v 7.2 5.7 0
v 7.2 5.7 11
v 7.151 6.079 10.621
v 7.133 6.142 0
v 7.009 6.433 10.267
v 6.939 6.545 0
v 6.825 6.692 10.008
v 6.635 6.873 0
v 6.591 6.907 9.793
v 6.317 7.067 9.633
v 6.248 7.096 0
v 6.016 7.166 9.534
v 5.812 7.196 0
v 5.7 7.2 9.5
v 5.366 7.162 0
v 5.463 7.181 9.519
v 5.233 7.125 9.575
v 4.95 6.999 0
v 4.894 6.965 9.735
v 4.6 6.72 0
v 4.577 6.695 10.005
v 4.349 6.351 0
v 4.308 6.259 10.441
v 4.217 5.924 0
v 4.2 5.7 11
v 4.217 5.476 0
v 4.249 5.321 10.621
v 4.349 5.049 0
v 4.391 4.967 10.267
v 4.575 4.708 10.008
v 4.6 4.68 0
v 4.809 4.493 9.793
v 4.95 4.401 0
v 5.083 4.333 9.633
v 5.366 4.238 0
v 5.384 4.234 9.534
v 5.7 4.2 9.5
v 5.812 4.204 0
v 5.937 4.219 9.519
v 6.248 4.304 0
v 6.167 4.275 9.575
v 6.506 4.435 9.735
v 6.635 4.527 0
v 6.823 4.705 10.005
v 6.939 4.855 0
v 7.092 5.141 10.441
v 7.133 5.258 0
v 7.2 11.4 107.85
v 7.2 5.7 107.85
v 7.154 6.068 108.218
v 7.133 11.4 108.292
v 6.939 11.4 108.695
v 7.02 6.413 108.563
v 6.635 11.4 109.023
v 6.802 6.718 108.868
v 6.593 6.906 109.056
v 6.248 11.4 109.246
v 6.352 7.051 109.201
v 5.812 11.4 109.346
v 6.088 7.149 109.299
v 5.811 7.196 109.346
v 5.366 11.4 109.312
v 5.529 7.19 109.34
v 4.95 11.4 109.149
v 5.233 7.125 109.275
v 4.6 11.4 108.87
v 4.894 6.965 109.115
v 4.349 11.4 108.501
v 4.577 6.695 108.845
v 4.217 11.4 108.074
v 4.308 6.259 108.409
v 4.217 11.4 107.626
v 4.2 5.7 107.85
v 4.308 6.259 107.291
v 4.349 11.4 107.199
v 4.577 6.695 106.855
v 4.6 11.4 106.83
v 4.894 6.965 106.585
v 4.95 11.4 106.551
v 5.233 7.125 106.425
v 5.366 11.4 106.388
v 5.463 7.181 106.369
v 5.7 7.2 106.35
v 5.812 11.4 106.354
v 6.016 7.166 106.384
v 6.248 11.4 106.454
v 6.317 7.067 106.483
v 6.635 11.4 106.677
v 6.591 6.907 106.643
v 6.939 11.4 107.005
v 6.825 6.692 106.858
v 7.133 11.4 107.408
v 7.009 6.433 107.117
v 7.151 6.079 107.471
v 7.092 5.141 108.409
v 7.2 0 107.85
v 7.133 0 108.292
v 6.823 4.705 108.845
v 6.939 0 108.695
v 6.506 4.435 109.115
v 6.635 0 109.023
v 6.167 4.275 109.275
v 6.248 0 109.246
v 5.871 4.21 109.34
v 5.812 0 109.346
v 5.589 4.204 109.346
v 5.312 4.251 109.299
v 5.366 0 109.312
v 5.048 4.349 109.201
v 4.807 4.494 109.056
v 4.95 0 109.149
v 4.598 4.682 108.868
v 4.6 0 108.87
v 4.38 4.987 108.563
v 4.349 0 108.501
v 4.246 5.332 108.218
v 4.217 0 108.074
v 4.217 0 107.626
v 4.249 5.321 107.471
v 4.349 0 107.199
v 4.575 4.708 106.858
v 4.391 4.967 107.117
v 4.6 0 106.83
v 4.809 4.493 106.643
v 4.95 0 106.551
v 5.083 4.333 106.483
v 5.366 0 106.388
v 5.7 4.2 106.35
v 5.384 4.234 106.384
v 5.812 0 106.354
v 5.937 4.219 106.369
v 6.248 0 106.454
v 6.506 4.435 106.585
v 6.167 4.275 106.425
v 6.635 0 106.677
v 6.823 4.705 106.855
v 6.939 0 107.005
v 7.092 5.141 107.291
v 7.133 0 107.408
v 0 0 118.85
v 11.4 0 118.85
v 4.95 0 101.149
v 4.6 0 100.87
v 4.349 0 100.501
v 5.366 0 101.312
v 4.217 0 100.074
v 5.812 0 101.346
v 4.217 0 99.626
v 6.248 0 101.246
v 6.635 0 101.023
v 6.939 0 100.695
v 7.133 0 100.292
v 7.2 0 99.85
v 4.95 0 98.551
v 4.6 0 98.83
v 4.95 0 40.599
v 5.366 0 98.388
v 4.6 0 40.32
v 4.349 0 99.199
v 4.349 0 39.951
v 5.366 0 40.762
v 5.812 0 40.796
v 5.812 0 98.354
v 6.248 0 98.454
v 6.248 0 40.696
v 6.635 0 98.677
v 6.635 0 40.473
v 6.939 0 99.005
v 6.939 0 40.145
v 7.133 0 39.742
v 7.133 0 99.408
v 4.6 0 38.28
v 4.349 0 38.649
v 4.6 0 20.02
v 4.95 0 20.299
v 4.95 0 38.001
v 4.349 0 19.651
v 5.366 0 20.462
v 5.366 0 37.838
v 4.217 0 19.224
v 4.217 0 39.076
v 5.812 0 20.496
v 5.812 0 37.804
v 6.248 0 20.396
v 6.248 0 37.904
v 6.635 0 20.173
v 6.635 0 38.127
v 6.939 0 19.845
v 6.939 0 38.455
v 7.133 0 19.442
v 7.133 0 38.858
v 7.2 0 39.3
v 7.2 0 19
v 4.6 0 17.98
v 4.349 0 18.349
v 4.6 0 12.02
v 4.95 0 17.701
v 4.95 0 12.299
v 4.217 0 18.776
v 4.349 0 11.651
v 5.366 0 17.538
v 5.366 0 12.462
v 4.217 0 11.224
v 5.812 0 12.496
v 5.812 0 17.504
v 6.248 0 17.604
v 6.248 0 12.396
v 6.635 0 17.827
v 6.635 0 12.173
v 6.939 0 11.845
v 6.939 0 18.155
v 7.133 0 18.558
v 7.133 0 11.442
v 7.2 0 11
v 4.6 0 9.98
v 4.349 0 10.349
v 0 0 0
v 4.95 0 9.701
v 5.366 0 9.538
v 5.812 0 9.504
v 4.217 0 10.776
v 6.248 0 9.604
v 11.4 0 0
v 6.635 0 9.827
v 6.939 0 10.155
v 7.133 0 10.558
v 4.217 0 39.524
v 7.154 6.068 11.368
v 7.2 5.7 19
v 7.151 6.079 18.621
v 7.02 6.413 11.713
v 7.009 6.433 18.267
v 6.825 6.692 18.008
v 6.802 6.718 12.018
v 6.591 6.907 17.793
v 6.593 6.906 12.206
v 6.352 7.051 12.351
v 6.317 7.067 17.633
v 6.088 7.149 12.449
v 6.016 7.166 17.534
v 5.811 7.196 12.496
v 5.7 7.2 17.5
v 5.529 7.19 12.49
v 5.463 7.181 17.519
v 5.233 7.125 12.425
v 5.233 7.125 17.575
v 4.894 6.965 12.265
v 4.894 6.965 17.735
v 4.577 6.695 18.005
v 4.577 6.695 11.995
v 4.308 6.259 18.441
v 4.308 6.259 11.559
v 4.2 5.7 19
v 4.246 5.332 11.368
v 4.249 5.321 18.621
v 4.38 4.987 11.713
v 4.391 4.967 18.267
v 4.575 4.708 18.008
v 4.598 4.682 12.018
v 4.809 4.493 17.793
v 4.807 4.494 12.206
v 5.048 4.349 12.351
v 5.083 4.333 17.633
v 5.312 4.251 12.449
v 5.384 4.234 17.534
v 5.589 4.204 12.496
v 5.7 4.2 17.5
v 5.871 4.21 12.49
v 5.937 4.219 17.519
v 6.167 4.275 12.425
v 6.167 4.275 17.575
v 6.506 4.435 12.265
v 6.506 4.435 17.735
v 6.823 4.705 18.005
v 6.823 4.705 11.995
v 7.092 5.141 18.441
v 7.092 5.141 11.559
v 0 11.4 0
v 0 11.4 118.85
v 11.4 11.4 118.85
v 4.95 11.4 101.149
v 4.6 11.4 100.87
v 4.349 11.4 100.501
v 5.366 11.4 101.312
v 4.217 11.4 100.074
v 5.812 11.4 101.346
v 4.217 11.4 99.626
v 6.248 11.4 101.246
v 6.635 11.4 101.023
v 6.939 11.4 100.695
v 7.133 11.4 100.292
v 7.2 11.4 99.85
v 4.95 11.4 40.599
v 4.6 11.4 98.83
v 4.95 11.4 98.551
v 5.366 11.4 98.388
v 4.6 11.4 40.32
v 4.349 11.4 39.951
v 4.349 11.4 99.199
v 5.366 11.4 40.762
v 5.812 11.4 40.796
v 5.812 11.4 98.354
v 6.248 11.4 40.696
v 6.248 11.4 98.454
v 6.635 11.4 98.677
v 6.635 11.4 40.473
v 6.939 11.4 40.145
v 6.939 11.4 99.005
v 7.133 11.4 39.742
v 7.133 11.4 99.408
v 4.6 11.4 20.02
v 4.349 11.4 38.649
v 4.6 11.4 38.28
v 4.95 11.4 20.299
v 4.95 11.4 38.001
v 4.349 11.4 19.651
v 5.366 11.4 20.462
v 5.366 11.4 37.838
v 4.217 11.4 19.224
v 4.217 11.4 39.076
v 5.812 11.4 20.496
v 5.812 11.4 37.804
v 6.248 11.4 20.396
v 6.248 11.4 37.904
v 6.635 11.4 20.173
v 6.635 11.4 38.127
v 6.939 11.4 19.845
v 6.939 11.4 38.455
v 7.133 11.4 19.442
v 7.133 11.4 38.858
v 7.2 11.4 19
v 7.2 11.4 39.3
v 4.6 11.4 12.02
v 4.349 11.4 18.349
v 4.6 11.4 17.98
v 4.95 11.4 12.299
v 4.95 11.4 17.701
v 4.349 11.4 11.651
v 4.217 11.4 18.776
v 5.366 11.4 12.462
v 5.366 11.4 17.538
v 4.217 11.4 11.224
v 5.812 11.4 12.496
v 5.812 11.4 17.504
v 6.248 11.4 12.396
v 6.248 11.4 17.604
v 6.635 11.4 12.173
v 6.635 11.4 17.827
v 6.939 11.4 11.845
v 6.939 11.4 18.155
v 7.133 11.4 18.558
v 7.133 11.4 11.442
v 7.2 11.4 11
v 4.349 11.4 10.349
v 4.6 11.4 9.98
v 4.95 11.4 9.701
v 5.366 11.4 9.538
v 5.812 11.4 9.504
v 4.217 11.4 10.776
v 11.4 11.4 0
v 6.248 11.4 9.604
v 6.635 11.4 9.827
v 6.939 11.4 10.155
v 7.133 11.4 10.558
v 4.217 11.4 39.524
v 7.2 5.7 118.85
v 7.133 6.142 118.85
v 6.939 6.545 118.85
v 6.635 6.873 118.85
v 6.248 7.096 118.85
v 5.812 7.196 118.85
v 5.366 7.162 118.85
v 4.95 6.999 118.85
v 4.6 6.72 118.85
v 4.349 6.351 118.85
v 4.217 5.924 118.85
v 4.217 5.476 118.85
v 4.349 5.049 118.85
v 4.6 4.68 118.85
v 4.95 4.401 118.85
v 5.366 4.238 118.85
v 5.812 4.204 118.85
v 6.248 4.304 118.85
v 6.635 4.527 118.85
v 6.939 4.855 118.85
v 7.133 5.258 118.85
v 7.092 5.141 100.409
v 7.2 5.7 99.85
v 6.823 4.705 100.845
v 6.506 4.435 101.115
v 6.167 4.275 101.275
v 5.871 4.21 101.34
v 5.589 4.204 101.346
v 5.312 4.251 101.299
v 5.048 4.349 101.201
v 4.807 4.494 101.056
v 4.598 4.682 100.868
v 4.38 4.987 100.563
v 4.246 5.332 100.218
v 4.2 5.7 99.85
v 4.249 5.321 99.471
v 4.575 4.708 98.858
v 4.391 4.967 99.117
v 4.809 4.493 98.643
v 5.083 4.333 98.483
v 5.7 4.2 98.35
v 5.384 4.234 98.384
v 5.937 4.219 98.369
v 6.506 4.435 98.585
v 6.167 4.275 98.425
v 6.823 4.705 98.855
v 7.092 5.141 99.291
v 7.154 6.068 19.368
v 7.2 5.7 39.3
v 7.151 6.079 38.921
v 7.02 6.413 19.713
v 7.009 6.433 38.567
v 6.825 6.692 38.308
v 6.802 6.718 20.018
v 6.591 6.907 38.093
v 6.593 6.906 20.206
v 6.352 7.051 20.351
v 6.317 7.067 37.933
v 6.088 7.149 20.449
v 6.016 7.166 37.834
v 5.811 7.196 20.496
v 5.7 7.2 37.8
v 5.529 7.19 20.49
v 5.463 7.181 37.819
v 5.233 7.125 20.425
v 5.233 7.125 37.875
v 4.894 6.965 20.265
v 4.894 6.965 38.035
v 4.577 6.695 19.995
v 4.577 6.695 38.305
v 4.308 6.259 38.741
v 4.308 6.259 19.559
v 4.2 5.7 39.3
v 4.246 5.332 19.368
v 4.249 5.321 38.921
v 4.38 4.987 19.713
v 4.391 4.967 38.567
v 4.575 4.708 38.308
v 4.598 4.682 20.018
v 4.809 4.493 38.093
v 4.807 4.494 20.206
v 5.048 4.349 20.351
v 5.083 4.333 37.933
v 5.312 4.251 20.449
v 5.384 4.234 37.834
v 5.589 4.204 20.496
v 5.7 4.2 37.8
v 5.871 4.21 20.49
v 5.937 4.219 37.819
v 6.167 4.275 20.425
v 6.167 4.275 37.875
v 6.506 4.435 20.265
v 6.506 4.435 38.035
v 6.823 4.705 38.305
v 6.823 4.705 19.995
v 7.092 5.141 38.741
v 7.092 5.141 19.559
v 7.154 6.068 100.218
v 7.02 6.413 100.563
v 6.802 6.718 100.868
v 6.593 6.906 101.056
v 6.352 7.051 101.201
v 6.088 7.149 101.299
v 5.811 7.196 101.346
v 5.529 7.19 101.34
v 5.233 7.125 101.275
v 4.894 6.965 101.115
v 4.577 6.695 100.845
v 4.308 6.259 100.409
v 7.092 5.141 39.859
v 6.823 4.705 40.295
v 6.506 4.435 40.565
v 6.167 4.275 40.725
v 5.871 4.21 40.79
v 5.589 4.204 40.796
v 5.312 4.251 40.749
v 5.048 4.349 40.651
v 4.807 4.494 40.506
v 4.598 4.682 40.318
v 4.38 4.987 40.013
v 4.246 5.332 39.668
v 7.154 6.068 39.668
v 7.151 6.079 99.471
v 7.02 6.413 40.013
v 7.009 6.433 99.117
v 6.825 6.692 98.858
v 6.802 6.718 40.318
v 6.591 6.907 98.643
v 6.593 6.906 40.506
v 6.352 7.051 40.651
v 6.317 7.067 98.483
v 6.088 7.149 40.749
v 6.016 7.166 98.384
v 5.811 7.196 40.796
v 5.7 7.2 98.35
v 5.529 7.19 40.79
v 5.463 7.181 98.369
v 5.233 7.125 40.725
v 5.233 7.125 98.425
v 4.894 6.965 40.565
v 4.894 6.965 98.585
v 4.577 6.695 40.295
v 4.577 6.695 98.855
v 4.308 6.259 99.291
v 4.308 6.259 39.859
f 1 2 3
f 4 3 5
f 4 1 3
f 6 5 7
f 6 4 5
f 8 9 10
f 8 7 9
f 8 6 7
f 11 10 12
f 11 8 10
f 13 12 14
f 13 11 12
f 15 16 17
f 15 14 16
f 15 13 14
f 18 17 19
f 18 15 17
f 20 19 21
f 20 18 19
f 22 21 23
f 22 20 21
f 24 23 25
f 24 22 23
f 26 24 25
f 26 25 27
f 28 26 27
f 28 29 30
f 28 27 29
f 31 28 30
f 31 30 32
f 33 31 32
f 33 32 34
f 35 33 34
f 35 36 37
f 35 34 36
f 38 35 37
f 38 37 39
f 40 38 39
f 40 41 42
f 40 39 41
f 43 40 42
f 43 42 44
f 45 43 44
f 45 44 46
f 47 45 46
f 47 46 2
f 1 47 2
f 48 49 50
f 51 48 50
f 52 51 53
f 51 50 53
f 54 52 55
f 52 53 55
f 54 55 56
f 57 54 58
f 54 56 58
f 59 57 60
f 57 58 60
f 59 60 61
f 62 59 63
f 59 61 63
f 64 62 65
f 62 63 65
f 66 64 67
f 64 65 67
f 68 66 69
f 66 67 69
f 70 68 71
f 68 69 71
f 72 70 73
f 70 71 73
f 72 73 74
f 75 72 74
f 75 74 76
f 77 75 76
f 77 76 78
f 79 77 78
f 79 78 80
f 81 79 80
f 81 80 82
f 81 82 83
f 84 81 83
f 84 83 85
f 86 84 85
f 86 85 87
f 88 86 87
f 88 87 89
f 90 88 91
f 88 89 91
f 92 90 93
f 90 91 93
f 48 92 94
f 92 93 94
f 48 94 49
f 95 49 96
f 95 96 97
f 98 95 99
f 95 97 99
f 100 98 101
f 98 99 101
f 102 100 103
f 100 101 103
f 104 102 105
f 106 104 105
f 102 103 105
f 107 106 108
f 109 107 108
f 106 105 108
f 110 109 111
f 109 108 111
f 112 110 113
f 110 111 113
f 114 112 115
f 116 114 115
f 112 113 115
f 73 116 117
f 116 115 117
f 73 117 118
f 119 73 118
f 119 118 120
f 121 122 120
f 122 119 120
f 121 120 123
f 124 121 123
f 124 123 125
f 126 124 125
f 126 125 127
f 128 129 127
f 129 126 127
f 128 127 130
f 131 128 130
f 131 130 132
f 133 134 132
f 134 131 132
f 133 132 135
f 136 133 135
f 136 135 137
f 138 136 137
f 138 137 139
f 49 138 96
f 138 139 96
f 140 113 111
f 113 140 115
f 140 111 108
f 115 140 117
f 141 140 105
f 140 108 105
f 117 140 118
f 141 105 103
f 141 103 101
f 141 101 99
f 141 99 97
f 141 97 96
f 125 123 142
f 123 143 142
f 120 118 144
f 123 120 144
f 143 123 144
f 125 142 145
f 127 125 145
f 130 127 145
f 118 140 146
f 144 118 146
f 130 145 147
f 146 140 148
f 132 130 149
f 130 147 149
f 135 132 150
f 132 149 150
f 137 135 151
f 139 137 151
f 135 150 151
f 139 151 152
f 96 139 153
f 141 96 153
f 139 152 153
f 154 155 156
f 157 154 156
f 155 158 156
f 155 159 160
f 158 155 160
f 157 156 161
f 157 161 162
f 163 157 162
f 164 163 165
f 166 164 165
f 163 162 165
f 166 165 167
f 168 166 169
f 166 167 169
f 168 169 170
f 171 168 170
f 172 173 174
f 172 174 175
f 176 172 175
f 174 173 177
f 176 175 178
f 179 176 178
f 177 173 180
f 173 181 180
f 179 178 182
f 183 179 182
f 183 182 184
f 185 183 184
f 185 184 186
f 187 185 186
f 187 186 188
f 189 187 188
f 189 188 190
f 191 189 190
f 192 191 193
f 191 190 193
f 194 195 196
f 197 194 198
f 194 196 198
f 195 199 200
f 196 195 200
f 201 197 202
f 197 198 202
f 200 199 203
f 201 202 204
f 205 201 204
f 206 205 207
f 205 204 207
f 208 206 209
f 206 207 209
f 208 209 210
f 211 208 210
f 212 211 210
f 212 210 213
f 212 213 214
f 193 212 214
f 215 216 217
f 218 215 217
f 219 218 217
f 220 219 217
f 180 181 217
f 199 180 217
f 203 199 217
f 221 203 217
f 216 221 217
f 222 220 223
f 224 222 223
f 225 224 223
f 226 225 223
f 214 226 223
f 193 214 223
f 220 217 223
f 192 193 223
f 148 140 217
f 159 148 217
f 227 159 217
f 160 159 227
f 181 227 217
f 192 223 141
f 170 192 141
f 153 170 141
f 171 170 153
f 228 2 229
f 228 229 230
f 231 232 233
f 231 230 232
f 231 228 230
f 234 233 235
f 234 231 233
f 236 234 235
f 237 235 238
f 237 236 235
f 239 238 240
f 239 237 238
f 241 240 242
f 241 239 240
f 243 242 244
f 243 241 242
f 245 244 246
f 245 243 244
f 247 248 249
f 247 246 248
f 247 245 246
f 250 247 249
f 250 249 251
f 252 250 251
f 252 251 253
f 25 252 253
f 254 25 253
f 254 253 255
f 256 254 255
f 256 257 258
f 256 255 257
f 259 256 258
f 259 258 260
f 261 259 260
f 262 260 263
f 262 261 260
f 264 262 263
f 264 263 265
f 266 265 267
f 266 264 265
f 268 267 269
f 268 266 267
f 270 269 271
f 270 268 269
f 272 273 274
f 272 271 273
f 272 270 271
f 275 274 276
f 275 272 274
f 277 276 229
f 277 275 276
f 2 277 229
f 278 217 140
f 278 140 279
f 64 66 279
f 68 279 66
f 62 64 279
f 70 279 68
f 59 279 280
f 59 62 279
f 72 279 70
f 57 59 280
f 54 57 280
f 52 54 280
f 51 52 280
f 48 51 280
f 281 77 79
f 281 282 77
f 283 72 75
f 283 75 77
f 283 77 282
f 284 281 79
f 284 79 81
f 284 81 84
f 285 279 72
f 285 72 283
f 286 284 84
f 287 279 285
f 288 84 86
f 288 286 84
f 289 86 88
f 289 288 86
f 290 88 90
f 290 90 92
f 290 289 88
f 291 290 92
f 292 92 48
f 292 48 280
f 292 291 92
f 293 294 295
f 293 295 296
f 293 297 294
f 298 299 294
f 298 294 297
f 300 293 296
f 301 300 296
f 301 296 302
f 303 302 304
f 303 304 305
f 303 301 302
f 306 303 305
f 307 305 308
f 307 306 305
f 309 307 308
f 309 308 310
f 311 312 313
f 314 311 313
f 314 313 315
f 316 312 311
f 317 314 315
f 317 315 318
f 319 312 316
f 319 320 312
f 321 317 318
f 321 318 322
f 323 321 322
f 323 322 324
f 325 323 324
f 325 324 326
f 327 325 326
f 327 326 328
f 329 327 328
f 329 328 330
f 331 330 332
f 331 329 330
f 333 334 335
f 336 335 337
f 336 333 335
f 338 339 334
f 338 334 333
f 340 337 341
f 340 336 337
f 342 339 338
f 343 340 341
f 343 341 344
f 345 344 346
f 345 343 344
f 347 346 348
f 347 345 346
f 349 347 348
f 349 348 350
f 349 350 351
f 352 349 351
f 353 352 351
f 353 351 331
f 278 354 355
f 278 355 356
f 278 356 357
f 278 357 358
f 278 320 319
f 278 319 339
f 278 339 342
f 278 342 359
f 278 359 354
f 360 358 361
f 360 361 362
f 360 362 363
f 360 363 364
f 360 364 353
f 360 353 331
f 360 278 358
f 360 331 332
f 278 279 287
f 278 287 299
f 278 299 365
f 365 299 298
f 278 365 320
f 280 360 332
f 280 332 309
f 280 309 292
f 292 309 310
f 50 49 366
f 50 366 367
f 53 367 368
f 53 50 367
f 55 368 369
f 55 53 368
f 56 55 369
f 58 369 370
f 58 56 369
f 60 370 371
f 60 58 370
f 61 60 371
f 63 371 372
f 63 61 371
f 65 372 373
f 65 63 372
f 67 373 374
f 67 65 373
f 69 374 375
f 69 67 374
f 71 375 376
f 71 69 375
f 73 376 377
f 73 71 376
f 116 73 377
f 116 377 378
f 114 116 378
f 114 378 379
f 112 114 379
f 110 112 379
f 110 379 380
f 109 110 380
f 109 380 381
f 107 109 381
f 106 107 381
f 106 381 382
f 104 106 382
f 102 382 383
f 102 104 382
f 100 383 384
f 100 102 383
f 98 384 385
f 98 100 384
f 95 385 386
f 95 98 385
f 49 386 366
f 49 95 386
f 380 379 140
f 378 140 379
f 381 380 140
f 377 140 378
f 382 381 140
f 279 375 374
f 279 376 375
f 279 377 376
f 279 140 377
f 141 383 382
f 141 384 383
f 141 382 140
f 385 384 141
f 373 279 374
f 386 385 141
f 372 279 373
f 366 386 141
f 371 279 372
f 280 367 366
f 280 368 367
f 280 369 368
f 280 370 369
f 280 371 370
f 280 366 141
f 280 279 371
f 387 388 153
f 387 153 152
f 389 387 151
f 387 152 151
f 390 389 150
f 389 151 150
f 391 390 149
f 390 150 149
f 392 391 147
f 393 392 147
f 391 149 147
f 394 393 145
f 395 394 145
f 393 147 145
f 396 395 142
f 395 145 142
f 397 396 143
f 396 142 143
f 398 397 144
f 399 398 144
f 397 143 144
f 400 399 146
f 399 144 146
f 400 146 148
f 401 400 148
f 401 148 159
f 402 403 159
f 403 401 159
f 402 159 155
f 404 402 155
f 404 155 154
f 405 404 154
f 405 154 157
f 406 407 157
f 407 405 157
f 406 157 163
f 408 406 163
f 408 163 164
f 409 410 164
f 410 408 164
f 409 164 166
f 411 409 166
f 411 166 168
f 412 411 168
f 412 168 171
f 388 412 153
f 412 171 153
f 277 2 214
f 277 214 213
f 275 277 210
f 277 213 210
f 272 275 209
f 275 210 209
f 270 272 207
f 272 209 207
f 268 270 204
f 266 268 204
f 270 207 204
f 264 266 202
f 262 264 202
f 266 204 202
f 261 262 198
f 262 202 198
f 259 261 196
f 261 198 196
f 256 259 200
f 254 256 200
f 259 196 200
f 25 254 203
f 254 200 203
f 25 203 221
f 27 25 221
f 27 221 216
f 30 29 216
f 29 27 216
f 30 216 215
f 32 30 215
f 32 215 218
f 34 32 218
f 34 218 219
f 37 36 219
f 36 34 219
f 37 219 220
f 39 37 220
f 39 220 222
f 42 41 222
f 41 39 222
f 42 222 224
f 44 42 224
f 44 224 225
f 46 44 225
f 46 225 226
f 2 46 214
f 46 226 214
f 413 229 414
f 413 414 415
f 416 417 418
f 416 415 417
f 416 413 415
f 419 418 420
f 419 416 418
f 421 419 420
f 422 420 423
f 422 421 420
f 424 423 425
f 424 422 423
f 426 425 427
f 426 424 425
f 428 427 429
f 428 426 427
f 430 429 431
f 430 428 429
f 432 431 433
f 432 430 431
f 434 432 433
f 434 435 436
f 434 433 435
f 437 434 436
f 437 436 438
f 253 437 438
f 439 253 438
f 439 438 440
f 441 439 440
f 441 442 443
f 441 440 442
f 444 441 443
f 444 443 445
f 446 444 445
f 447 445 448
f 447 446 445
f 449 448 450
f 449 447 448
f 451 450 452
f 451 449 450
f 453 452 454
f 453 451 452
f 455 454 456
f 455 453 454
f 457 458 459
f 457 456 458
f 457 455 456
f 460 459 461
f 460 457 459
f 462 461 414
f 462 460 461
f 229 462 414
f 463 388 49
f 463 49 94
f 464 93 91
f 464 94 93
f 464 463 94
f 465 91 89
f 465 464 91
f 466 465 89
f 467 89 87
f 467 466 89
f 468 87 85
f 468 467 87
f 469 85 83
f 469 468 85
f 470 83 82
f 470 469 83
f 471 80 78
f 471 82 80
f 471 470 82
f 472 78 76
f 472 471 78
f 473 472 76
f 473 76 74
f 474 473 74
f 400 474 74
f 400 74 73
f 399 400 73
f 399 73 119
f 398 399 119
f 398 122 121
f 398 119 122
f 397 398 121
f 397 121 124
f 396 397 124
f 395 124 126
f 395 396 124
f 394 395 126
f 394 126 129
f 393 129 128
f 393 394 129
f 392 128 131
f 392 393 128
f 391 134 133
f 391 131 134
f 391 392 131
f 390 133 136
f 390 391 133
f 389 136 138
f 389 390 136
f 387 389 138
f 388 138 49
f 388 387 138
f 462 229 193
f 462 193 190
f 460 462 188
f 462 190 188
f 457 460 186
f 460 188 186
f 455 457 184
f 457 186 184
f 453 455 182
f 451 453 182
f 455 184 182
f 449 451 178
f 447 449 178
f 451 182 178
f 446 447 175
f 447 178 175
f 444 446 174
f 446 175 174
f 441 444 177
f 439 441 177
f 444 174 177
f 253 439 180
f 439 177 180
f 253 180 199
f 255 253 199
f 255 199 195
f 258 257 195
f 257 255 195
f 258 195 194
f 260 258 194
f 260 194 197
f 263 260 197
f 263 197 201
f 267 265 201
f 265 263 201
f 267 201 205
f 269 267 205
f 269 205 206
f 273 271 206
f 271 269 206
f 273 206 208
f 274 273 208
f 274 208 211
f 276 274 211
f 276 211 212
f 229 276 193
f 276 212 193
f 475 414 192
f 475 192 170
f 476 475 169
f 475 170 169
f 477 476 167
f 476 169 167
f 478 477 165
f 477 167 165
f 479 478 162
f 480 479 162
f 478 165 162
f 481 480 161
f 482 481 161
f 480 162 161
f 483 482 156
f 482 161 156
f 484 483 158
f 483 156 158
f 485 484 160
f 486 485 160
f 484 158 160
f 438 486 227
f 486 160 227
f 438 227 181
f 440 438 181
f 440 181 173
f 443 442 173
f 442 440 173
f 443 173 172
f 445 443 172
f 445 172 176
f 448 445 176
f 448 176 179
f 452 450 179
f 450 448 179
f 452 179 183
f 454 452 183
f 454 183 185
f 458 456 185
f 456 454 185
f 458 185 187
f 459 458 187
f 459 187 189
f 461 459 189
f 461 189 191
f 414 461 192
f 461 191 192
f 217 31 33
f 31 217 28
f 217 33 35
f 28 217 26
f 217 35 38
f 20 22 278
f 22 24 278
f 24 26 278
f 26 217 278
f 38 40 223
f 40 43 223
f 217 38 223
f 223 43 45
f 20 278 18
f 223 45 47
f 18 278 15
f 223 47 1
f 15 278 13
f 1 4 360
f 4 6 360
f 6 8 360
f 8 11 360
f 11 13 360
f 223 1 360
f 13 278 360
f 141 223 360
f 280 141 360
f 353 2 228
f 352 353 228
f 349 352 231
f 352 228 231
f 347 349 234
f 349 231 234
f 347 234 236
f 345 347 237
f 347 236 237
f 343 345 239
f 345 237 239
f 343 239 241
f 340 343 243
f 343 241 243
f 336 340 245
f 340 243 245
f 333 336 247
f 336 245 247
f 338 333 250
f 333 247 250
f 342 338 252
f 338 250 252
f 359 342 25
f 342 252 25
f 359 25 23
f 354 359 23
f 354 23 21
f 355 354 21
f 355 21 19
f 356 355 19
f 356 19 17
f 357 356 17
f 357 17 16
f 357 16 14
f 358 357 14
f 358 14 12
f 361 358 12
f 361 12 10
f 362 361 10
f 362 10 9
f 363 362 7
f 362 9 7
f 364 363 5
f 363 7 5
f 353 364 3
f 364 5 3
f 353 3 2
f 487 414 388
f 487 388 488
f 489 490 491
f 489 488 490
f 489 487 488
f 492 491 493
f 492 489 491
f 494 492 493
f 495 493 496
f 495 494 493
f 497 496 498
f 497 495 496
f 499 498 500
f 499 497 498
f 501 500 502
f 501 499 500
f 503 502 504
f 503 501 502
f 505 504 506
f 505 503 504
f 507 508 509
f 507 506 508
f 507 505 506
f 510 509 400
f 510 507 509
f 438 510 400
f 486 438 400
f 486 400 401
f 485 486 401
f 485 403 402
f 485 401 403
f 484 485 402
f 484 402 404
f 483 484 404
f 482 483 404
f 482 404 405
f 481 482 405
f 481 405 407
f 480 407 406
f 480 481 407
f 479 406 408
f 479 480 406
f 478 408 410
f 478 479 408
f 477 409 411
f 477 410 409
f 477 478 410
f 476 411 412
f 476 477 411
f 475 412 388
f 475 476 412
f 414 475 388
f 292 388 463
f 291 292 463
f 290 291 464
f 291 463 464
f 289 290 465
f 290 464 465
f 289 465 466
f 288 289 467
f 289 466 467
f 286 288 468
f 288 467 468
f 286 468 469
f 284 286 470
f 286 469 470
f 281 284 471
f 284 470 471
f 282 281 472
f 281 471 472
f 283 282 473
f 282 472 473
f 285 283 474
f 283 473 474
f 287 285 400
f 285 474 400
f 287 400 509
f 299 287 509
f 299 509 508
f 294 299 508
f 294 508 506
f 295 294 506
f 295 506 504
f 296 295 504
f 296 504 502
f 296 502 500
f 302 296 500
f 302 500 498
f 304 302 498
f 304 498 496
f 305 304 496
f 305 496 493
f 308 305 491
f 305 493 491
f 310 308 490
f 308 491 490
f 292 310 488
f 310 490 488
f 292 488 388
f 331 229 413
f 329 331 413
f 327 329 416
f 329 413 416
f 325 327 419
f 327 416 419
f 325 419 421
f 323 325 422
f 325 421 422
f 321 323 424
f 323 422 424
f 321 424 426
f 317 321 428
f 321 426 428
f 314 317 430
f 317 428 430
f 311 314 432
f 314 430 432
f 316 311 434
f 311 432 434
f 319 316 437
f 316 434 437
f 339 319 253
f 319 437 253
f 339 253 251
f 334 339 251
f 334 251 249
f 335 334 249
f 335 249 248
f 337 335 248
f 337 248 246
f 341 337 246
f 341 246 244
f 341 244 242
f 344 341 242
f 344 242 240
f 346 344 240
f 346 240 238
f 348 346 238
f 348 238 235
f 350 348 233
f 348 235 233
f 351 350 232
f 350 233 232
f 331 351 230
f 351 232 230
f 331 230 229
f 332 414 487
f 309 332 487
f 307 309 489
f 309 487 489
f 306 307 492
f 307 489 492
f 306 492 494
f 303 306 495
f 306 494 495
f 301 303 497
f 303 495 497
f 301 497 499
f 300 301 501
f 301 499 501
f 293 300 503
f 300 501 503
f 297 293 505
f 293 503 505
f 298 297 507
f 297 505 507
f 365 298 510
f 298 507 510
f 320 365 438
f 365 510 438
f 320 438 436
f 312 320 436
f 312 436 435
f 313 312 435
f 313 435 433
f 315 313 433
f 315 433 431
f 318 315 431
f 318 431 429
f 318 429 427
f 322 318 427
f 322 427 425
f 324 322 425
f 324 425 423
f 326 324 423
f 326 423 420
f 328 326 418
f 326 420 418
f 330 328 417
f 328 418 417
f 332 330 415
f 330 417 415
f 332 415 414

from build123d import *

# Parameters (mm, degrees)
SKETCH_W     = 11.4
SKETCH_H     = 11.4
SKETCH_R     = 1.5
PAD_DEPTH    = 118.85
SKETCH001_R  = 1.5
POCKET_DEPTH = 11.401


with BuildPart() as part:
    # Sketch → Pad (new body)
    with BuildSketch(Plane.XY):
        with Locations((5.7, 5.7)):
            Rectangle(SKETCH_W, SKETCH_H)
        with Locations((5.7, 5.7)):
            Circle(SKETCH_R, mode=Mode.SUBTRACT)
    extrude(amount=PAD_DEPTH)

    # Sketch001 → Pocket (cut, through all)
    with BuildSketch(Plane.XZ):
        with Locations((5.7, 11)):
            Circle(SKETCH001_R)
        with Locations((5.7, 19)):
            Circle(SKETCH001_R)
        with Locations((5.7, 107.85)):
            Circle(SKETCH001_R)
        with Locations((5.7, 99.85)):
            Circle(SKETCH001_R)
        with Locations((5.7, 39.3)):
            Circle(SKETCH001_R)
    extrude(amount=-POCKET_DEPTH, mode=Mode.SUBTRACT)


solid = part.part
